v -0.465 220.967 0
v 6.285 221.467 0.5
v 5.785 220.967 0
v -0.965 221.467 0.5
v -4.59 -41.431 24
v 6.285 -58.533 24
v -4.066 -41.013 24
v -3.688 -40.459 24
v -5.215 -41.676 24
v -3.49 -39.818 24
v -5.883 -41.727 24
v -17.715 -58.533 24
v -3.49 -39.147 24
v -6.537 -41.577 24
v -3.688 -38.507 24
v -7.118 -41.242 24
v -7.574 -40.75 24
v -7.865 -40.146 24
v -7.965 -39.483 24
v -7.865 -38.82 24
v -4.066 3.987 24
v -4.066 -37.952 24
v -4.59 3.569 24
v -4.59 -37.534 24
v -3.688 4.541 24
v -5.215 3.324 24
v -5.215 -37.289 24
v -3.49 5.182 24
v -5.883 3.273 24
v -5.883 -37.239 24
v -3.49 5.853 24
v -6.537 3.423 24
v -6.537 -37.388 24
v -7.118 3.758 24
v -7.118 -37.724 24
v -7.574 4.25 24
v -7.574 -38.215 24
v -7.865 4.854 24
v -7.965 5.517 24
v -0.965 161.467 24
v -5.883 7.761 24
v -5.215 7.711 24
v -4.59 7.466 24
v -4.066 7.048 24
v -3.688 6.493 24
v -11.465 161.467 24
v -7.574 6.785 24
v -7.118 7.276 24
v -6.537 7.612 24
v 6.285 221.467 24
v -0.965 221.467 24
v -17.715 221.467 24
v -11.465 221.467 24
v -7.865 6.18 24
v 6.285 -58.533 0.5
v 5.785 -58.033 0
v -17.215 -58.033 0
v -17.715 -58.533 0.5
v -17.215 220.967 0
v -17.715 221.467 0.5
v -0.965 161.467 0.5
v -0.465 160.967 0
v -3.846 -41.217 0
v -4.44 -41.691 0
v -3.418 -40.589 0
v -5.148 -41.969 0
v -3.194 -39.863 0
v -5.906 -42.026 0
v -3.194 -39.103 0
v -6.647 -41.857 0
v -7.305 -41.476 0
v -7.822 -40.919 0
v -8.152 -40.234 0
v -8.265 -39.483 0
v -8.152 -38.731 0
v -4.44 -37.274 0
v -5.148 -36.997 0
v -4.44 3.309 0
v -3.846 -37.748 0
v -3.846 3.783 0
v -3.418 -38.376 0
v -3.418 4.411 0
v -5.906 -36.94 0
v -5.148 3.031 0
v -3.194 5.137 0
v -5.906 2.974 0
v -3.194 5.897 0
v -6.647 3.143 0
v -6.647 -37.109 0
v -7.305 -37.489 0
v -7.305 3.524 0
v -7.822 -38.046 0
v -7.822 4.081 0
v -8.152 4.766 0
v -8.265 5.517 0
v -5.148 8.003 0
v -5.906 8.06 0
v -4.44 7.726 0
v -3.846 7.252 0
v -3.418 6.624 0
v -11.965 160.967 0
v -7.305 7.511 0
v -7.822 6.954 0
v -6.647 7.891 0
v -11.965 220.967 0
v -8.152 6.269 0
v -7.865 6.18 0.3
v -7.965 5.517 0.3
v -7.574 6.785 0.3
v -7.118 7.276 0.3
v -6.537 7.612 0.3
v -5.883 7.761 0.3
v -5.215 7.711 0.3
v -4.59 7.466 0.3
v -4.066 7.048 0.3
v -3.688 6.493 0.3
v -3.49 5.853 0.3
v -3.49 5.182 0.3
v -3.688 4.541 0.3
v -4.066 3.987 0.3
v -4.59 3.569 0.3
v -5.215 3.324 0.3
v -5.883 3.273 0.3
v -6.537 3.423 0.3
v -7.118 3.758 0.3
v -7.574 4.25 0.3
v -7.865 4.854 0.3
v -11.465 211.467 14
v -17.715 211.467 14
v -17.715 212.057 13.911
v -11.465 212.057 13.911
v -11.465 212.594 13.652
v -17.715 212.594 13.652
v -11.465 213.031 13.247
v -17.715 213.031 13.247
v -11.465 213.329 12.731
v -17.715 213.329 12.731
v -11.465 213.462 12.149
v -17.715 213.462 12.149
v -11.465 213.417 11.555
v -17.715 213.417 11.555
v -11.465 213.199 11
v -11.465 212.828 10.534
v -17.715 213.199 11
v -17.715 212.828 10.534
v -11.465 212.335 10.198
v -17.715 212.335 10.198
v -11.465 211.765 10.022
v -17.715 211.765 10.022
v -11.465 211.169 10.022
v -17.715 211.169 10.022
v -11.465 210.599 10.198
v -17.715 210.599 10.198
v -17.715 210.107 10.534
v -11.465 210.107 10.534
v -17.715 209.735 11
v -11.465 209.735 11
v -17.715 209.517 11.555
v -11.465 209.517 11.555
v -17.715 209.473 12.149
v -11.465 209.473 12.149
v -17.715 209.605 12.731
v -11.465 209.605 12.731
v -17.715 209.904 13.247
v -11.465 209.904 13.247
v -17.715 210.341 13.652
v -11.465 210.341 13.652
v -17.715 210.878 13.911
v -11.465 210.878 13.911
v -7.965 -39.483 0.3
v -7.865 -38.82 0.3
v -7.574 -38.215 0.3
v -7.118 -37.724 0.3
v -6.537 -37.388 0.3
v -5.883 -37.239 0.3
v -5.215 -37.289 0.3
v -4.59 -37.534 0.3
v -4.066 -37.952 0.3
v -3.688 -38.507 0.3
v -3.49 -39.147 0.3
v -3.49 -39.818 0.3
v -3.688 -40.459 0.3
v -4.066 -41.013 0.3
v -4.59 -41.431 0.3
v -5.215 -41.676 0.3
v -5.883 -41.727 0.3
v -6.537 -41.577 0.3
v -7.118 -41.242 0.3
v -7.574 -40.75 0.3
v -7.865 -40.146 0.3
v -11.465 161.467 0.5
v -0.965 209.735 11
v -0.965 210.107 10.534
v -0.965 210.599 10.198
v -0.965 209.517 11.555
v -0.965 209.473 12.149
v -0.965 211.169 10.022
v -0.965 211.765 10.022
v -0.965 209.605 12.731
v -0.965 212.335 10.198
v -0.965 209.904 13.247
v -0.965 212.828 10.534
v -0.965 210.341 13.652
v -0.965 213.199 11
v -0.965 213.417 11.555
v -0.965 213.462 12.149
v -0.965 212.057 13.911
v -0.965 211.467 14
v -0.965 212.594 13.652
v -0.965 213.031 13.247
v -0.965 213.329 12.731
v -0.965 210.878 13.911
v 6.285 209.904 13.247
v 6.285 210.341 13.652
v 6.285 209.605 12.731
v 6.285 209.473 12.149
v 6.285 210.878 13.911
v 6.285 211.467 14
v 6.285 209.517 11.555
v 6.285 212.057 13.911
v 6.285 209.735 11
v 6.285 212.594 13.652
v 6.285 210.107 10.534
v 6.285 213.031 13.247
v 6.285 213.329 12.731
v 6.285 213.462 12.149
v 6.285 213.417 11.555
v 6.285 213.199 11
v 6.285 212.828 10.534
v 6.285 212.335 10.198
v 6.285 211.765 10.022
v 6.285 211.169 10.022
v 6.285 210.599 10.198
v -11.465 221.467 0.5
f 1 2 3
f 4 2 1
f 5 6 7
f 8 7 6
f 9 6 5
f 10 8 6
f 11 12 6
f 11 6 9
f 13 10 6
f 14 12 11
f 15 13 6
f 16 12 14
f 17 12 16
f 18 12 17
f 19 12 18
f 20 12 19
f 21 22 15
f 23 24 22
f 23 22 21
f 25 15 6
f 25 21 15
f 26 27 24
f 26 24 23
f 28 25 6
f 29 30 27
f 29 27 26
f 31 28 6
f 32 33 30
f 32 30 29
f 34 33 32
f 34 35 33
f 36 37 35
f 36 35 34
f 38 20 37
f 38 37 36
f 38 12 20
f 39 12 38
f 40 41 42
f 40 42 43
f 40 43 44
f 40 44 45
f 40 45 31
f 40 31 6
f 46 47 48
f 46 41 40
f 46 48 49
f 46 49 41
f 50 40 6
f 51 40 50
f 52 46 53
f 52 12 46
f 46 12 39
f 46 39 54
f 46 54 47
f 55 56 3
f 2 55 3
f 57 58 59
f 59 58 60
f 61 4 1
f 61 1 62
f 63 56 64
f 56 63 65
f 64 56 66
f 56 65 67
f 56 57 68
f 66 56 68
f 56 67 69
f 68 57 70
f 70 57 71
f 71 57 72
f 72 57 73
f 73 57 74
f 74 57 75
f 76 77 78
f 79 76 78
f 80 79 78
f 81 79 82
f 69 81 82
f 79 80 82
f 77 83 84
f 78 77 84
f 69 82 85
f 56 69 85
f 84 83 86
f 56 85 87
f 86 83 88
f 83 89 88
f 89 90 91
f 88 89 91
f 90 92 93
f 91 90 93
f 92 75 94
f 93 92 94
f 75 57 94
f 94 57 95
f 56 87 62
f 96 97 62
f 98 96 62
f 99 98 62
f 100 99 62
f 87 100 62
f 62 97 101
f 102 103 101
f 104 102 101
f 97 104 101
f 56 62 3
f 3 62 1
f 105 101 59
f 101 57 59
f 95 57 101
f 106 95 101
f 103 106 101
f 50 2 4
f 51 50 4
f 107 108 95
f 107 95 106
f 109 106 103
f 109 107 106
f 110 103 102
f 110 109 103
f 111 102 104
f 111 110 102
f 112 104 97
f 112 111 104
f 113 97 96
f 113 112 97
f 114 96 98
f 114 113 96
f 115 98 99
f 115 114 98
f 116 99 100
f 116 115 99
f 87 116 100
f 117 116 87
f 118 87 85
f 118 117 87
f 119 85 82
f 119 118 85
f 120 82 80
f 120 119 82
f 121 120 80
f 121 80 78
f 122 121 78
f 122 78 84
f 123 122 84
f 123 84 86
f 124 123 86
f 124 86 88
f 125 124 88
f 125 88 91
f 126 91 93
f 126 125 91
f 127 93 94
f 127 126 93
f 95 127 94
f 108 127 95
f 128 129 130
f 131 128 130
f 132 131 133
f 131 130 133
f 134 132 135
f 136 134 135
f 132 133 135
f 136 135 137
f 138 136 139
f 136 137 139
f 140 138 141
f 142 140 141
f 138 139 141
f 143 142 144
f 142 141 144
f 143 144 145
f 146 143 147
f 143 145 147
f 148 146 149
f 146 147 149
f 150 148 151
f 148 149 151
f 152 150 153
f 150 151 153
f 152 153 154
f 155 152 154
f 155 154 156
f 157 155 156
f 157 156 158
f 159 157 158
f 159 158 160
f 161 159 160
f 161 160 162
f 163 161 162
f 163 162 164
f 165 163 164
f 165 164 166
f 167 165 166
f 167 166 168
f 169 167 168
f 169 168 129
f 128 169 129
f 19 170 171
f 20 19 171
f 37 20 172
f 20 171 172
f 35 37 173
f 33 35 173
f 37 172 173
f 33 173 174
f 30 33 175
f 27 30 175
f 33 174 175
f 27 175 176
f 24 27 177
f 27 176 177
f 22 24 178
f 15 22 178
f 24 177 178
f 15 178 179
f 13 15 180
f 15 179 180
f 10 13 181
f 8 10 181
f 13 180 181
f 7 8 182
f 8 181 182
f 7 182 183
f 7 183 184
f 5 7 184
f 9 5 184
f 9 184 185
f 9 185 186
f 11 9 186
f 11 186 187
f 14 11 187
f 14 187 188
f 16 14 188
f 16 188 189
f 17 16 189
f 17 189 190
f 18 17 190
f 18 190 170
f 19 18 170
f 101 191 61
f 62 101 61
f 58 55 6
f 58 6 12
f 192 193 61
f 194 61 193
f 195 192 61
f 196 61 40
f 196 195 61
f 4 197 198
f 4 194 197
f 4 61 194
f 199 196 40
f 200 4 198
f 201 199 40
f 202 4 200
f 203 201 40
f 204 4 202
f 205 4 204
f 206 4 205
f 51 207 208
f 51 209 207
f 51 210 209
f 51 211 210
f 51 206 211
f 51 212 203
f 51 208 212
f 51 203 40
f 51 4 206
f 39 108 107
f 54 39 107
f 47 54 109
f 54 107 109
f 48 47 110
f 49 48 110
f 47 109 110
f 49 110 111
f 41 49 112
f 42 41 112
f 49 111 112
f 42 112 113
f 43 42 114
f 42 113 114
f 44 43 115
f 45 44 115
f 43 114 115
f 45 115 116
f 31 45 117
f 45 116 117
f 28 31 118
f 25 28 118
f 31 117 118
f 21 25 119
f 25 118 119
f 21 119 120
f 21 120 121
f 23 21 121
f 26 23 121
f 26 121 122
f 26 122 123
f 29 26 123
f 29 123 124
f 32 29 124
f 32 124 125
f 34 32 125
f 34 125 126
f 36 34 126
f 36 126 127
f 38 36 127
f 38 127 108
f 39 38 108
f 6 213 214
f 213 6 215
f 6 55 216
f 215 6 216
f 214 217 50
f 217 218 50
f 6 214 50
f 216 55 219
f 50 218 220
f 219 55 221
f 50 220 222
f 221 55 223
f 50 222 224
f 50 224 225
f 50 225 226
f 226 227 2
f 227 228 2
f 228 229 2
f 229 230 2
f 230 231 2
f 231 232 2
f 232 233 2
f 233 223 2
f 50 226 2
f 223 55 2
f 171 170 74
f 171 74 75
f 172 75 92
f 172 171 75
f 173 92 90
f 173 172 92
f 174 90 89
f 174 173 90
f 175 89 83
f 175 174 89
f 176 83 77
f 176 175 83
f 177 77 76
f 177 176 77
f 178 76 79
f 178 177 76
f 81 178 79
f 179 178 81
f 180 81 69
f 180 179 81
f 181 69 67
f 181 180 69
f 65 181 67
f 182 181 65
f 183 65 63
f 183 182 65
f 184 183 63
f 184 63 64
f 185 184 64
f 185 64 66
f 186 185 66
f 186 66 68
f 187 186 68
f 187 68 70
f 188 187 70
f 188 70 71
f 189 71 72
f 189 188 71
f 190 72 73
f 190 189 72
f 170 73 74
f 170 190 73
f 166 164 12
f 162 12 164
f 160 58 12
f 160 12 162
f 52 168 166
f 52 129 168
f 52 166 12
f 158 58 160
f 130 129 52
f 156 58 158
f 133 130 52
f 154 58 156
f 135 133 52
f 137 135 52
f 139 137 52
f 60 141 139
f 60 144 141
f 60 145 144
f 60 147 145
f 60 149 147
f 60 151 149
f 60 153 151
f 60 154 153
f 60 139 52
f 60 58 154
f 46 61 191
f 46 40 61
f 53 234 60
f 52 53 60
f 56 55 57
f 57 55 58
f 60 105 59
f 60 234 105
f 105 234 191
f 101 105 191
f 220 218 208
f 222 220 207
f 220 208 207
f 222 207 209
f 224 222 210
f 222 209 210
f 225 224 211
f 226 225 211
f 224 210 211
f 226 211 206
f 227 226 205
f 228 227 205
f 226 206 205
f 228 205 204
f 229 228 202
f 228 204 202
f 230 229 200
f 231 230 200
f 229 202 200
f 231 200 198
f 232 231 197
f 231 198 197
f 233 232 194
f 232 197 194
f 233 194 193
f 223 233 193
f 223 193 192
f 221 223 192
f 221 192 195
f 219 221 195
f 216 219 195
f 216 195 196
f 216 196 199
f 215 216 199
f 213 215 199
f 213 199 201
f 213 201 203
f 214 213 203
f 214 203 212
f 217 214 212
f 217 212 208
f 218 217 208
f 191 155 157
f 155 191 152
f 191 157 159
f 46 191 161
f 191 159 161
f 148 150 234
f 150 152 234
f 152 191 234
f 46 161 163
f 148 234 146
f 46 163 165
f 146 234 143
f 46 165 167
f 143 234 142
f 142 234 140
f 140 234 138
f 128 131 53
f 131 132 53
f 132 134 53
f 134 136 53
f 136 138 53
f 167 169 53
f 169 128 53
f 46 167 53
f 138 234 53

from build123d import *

# Parameters (mm, degrees)
ESQUISSE1_W        = 280
ESQUISSE1_H        = 24
MAIN_DEPTH         = 24
ESQUISSE3_W        = 10.5
ESQUISSE3_H        = 24
FOURCHE_DEPTH      = 60
ESQUISSE5_R        = 2
TROU_FOURCHE_DEPTH = 27
ESQUISSE6_R        = 2.25
TROU_EQUERRE_DEPTH = 27
CHANFREIN1_SIZE    = 0.5
CHANFREIN2_SIZE    = 0.5
CHANFREIN3_SIZE    = 0.5
CHANFREIN4_SIZE    = 0.5
CHANFREIN5_SIZE    = 0.5
CHANFREIN6_SIZE    = 0.5
CHANFREIN7_SIZE    = 0.5
CHANFREIN8_SIZE    = 0.3
CHANFREIN9_SIZE    = 0.3
CHANFREIN11_SIZE   = 0.5


with BuildPart() as part:
    # Esquisse1 → main (new body)
    with BuildSketch(Plane(origin=(0, 0, 0), x_dir=(0, 1, 0), z_dir=(0, 0, 1))):
        with Locations((81.467203596, 5.71524514)):
            Rectangle(ESQUISSE1_W, ESQUISSE1_H)
    extrude(amount=MAIN_DEPTH)

    # Esquisse3 → fourche (cut)
    with BuildSketch(Plane(origin=(0, 221.467203596, 0), x_dir=(-1, 0, 0), z_dir=(0, 1, 0))):
        with Locations((6.21524514, 12)):
            Rectangle(ESQUISSE3_W, ESQUISSE3_H)
    extrude(amount=-FOURCHE_DEPTH, mode=Mode.SUBTRACT)

    # Esquisse5 → trou_fourche (cut)
    with BuildSketch(Plane(origin=(-17.71524514, 0, 0), x_dir=(0, -1, 0), z_dir=(-1, 0, 0))):
        with Locations(Location((-211.467203596, 12, 0), (0, 0, 90))):
            Circle(ESQUISSE5_R)
    extrude(amount=-TROU_FOURCHE_DEPTH, mode=Mode.SUBTRACT)

    # Esquisse6 → trou_equerre (cut)
    with BuildSketch(Plane(origin=(0, 0, 0), x_dir=(1, 0, 0), z_dir=(0, 0, -1))):
        with Locations(Location((-5.71524514, 39.482796404, 0), (0, 0, 180))):
            Circle(ESQUISSE6_R)
        with Locations(Location((-5.71524514, -5.517203596, 0), (0, 0, 180))):
            Circle(ESQUISSE6_R)
    extrude(amount=-TROU_EQUERRE_DEPTH, mode=Mode.SUBTRACT)

    # Chanfrein1
    chanfrein1_edges = [part.edges().sort_by_distance(p)[0] for p in [
        (6.28475486, 81.467203596, 0),
    ]]
    chamfer(chanfrein1_edges, length=CHANFREIN1_SIZE)

    # Chanfrein2
    chanfrein2_edges = [part.edges().sort_by_distance(p)[0] for p in [
        (-11.46524514, 191.467203596, 0),
    ]]
    chamfer(chanfrein2_edges, length=CHANFREIN2_SIZE)

    # Chanfrein3
    chanfrein3_edges = [part.edges().sort_by_distance(p)[0] for p in [
        (-0.96524514, 191.467203596, 0),
    ]]
    chamfer(chanfrein3_edges, length=CHANFREIN3_SIZE)

    # Chanfrein4
    chanfrein4_edges = [part.edges().sort_by_distance(p)[0] for p in [
        (-14.84024514, 221.467203596, 0),
    ]]
    chamfer(chanfrein4_edges, length=CHANFREIN4_SIZE)

    # Chanfrein5
    chanfrein5_edges = [part.edges().sort_by_distance(p)[0] for p in [
        (2.65975486, 221.467203596, 0),
    ]]
    chamfer(chanfrein5_edges, length=CHANFREIN5_SIZE)

    # Chanfrein6
    chanfrein6_edges = [part.edges().sort_by_distance(p)[0] for p in [
        (-6.21524514, 161.467203596, 0),
    ]]
    chamfer(chanfrein6_edges, length=CHANFREIN6_SIZE)

    # Chanfrein7
    chanfrein7_edges = [part.edges().sort_by_distance(p)[0] for p in [
        (-17.71524514, 81.217203596, 0),
    ]]
    chamfer(chanfrein7_edges, length=CHANFREIN7_SIZE)

    # Chanfrein8
    chanfrein8_edges = [part.edges().sort_by_distance(p)[0] for p in [
        (-3.46524514, 5.517203596, 0),
    ]]
    chamfer(chanfrein8_edges, length=CHANFREIN8_SIZE)

    # Chanfrein9
    chanfrein9_edges = [part.edges().sort_by_distance(p)[0] for p in [
        (-3.46524514, -39.482796404, 0),
    ]]
    chamfer(chanfrein9_edges, length=CHANFREIN9_SIZE)

    # Chanfrein11
    chanfrein11_edges = [part.edges().sort_by_distance(p)[0] for p in [
        (-5.71524514, -58.532796404, 0),
    ]]
    chamfer(chanfrein11_edges, length=CHANFREIN11_SIZE)


solid = part.part
